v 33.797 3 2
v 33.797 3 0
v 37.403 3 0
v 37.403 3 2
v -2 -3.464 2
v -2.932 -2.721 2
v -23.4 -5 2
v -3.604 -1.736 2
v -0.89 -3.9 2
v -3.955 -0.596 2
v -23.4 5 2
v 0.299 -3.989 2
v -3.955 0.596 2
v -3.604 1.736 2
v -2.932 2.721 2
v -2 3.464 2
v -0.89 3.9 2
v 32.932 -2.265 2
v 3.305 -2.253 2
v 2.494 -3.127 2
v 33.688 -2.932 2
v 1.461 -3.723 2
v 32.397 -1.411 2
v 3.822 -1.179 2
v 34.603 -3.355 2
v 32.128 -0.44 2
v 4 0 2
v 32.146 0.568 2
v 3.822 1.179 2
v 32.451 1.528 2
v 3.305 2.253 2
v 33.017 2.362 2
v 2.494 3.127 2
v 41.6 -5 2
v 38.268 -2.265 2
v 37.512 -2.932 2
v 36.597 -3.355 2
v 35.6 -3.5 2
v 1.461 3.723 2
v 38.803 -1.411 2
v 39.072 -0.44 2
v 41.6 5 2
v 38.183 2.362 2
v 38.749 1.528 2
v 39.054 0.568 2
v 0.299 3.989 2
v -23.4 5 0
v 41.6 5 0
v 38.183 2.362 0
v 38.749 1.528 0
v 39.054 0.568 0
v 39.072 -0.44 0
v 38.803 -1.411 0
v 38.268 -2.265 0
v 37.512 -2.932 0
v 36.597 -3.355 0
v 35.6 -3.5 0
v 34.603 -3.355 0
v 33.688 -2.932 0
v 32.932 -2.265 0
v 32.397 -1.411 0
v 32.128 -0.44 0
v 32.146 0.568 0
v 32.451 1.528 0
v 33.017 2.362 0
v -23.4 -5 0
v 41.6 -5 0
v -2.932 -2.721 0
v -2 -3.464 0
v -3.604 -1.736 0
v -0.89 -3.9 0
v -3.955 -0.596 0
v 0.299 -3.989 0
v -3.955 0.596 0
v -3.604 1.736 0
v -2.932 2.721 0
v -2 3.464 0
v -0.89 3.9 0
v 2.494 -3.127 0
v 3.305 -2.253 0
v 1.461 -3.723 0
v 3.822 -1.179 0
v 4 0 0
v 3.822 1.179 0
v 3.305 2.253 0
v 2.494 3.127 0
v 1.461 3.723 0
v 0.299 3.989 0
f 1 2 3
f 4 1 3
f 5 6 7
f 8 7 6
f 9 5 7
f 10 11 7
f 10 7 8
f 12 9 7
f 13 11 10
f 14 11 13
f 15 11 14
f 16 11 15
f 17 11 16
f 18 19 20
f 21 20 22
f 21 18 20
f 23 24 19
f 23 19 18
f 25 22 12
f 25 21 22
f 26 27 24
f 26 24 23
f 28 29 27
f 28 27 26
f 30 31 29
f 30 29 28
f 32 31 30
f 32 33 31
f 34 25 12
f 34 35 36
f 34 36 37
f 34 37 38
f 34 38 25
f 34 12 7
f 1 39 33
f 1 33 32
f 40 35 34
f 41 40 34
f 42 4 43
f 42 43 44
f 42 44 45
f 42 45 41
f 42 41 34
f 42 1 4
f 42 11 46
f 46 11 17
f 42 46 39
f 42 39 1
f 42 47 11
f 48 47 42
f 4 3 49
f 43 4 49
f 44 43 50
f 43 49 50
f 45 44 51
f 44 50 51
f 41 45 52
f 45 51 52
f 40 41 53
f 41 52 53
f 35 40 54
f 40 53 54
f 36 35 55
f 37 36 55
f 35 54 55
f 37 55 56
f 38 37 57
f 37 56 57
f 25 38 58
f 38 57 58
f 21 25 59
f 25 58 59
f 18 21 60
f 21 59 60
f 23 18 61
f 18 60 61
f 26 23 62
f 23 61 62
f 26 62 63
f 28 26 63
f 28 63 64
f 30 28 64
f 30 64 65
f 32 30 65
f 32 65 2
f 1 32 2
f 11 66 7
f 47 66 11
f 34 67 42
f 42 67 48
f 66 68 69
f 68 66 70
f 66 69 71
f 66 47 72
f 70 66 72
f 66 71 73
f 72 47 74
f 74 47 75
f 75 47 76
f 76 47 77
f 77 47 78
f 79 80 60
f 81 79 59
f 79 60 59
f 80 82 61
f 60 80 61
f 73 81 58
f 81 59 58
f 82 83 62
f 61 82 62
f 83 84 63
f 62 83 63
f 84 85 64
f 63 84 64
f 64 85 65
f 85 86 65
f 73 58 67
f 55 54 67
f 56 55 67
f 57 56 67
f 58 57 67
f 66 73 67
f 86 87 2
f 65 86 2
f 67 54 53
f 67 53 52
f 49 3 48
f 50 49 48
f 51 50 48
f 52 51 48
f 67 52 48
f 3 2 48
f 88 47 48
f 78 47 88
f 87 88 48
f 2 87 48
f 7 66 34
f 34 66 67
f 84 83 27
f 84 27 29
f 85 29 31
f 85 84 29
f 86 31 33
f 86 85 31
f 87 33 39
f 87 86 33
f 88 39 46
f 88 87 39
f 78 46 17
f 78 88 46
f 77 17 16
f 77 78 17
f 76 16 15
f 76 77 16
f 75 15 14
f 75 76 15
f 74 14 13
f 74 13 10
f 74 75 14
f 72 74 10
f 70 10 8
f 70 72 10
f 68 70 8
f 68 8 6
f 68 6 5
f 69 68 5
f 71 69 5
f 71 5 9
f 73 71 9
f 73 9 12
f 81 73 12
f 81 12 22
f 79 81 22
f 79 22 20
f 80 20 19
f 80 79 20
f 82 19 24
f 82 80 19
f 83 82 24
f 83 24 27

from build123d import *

# Parameters (mm, degrees)
SKETCH1_W           = 65
SKETCH1_H           = 10
SKETCH1_R           = 4
BOSS_EXTRUDE2_DEPTH = 2


with BuildPart() as part:
    # Sketch1 → Boss-Extrude2 (new body)
    with BuildSketch(Plane.XY):
        with Locations((9.1, 0)):
            Rectangle(SKETCH1_W, SKETCH1_H)
        Circle(SKETCH1_R, mode=Mode.SUBTRACT)
        with BuildLine():
            Line((33.797224362, 3), (37.402775638, 3))
            ThreePointArc((37.402775638, 3), (35.6, -3.5), (33.797224362, 3))
        make_face(mode=Mode.SUBTRACT)
    extrude(amount=BOSS_EXTRUDE2_DEPTH)


solid = part.part
